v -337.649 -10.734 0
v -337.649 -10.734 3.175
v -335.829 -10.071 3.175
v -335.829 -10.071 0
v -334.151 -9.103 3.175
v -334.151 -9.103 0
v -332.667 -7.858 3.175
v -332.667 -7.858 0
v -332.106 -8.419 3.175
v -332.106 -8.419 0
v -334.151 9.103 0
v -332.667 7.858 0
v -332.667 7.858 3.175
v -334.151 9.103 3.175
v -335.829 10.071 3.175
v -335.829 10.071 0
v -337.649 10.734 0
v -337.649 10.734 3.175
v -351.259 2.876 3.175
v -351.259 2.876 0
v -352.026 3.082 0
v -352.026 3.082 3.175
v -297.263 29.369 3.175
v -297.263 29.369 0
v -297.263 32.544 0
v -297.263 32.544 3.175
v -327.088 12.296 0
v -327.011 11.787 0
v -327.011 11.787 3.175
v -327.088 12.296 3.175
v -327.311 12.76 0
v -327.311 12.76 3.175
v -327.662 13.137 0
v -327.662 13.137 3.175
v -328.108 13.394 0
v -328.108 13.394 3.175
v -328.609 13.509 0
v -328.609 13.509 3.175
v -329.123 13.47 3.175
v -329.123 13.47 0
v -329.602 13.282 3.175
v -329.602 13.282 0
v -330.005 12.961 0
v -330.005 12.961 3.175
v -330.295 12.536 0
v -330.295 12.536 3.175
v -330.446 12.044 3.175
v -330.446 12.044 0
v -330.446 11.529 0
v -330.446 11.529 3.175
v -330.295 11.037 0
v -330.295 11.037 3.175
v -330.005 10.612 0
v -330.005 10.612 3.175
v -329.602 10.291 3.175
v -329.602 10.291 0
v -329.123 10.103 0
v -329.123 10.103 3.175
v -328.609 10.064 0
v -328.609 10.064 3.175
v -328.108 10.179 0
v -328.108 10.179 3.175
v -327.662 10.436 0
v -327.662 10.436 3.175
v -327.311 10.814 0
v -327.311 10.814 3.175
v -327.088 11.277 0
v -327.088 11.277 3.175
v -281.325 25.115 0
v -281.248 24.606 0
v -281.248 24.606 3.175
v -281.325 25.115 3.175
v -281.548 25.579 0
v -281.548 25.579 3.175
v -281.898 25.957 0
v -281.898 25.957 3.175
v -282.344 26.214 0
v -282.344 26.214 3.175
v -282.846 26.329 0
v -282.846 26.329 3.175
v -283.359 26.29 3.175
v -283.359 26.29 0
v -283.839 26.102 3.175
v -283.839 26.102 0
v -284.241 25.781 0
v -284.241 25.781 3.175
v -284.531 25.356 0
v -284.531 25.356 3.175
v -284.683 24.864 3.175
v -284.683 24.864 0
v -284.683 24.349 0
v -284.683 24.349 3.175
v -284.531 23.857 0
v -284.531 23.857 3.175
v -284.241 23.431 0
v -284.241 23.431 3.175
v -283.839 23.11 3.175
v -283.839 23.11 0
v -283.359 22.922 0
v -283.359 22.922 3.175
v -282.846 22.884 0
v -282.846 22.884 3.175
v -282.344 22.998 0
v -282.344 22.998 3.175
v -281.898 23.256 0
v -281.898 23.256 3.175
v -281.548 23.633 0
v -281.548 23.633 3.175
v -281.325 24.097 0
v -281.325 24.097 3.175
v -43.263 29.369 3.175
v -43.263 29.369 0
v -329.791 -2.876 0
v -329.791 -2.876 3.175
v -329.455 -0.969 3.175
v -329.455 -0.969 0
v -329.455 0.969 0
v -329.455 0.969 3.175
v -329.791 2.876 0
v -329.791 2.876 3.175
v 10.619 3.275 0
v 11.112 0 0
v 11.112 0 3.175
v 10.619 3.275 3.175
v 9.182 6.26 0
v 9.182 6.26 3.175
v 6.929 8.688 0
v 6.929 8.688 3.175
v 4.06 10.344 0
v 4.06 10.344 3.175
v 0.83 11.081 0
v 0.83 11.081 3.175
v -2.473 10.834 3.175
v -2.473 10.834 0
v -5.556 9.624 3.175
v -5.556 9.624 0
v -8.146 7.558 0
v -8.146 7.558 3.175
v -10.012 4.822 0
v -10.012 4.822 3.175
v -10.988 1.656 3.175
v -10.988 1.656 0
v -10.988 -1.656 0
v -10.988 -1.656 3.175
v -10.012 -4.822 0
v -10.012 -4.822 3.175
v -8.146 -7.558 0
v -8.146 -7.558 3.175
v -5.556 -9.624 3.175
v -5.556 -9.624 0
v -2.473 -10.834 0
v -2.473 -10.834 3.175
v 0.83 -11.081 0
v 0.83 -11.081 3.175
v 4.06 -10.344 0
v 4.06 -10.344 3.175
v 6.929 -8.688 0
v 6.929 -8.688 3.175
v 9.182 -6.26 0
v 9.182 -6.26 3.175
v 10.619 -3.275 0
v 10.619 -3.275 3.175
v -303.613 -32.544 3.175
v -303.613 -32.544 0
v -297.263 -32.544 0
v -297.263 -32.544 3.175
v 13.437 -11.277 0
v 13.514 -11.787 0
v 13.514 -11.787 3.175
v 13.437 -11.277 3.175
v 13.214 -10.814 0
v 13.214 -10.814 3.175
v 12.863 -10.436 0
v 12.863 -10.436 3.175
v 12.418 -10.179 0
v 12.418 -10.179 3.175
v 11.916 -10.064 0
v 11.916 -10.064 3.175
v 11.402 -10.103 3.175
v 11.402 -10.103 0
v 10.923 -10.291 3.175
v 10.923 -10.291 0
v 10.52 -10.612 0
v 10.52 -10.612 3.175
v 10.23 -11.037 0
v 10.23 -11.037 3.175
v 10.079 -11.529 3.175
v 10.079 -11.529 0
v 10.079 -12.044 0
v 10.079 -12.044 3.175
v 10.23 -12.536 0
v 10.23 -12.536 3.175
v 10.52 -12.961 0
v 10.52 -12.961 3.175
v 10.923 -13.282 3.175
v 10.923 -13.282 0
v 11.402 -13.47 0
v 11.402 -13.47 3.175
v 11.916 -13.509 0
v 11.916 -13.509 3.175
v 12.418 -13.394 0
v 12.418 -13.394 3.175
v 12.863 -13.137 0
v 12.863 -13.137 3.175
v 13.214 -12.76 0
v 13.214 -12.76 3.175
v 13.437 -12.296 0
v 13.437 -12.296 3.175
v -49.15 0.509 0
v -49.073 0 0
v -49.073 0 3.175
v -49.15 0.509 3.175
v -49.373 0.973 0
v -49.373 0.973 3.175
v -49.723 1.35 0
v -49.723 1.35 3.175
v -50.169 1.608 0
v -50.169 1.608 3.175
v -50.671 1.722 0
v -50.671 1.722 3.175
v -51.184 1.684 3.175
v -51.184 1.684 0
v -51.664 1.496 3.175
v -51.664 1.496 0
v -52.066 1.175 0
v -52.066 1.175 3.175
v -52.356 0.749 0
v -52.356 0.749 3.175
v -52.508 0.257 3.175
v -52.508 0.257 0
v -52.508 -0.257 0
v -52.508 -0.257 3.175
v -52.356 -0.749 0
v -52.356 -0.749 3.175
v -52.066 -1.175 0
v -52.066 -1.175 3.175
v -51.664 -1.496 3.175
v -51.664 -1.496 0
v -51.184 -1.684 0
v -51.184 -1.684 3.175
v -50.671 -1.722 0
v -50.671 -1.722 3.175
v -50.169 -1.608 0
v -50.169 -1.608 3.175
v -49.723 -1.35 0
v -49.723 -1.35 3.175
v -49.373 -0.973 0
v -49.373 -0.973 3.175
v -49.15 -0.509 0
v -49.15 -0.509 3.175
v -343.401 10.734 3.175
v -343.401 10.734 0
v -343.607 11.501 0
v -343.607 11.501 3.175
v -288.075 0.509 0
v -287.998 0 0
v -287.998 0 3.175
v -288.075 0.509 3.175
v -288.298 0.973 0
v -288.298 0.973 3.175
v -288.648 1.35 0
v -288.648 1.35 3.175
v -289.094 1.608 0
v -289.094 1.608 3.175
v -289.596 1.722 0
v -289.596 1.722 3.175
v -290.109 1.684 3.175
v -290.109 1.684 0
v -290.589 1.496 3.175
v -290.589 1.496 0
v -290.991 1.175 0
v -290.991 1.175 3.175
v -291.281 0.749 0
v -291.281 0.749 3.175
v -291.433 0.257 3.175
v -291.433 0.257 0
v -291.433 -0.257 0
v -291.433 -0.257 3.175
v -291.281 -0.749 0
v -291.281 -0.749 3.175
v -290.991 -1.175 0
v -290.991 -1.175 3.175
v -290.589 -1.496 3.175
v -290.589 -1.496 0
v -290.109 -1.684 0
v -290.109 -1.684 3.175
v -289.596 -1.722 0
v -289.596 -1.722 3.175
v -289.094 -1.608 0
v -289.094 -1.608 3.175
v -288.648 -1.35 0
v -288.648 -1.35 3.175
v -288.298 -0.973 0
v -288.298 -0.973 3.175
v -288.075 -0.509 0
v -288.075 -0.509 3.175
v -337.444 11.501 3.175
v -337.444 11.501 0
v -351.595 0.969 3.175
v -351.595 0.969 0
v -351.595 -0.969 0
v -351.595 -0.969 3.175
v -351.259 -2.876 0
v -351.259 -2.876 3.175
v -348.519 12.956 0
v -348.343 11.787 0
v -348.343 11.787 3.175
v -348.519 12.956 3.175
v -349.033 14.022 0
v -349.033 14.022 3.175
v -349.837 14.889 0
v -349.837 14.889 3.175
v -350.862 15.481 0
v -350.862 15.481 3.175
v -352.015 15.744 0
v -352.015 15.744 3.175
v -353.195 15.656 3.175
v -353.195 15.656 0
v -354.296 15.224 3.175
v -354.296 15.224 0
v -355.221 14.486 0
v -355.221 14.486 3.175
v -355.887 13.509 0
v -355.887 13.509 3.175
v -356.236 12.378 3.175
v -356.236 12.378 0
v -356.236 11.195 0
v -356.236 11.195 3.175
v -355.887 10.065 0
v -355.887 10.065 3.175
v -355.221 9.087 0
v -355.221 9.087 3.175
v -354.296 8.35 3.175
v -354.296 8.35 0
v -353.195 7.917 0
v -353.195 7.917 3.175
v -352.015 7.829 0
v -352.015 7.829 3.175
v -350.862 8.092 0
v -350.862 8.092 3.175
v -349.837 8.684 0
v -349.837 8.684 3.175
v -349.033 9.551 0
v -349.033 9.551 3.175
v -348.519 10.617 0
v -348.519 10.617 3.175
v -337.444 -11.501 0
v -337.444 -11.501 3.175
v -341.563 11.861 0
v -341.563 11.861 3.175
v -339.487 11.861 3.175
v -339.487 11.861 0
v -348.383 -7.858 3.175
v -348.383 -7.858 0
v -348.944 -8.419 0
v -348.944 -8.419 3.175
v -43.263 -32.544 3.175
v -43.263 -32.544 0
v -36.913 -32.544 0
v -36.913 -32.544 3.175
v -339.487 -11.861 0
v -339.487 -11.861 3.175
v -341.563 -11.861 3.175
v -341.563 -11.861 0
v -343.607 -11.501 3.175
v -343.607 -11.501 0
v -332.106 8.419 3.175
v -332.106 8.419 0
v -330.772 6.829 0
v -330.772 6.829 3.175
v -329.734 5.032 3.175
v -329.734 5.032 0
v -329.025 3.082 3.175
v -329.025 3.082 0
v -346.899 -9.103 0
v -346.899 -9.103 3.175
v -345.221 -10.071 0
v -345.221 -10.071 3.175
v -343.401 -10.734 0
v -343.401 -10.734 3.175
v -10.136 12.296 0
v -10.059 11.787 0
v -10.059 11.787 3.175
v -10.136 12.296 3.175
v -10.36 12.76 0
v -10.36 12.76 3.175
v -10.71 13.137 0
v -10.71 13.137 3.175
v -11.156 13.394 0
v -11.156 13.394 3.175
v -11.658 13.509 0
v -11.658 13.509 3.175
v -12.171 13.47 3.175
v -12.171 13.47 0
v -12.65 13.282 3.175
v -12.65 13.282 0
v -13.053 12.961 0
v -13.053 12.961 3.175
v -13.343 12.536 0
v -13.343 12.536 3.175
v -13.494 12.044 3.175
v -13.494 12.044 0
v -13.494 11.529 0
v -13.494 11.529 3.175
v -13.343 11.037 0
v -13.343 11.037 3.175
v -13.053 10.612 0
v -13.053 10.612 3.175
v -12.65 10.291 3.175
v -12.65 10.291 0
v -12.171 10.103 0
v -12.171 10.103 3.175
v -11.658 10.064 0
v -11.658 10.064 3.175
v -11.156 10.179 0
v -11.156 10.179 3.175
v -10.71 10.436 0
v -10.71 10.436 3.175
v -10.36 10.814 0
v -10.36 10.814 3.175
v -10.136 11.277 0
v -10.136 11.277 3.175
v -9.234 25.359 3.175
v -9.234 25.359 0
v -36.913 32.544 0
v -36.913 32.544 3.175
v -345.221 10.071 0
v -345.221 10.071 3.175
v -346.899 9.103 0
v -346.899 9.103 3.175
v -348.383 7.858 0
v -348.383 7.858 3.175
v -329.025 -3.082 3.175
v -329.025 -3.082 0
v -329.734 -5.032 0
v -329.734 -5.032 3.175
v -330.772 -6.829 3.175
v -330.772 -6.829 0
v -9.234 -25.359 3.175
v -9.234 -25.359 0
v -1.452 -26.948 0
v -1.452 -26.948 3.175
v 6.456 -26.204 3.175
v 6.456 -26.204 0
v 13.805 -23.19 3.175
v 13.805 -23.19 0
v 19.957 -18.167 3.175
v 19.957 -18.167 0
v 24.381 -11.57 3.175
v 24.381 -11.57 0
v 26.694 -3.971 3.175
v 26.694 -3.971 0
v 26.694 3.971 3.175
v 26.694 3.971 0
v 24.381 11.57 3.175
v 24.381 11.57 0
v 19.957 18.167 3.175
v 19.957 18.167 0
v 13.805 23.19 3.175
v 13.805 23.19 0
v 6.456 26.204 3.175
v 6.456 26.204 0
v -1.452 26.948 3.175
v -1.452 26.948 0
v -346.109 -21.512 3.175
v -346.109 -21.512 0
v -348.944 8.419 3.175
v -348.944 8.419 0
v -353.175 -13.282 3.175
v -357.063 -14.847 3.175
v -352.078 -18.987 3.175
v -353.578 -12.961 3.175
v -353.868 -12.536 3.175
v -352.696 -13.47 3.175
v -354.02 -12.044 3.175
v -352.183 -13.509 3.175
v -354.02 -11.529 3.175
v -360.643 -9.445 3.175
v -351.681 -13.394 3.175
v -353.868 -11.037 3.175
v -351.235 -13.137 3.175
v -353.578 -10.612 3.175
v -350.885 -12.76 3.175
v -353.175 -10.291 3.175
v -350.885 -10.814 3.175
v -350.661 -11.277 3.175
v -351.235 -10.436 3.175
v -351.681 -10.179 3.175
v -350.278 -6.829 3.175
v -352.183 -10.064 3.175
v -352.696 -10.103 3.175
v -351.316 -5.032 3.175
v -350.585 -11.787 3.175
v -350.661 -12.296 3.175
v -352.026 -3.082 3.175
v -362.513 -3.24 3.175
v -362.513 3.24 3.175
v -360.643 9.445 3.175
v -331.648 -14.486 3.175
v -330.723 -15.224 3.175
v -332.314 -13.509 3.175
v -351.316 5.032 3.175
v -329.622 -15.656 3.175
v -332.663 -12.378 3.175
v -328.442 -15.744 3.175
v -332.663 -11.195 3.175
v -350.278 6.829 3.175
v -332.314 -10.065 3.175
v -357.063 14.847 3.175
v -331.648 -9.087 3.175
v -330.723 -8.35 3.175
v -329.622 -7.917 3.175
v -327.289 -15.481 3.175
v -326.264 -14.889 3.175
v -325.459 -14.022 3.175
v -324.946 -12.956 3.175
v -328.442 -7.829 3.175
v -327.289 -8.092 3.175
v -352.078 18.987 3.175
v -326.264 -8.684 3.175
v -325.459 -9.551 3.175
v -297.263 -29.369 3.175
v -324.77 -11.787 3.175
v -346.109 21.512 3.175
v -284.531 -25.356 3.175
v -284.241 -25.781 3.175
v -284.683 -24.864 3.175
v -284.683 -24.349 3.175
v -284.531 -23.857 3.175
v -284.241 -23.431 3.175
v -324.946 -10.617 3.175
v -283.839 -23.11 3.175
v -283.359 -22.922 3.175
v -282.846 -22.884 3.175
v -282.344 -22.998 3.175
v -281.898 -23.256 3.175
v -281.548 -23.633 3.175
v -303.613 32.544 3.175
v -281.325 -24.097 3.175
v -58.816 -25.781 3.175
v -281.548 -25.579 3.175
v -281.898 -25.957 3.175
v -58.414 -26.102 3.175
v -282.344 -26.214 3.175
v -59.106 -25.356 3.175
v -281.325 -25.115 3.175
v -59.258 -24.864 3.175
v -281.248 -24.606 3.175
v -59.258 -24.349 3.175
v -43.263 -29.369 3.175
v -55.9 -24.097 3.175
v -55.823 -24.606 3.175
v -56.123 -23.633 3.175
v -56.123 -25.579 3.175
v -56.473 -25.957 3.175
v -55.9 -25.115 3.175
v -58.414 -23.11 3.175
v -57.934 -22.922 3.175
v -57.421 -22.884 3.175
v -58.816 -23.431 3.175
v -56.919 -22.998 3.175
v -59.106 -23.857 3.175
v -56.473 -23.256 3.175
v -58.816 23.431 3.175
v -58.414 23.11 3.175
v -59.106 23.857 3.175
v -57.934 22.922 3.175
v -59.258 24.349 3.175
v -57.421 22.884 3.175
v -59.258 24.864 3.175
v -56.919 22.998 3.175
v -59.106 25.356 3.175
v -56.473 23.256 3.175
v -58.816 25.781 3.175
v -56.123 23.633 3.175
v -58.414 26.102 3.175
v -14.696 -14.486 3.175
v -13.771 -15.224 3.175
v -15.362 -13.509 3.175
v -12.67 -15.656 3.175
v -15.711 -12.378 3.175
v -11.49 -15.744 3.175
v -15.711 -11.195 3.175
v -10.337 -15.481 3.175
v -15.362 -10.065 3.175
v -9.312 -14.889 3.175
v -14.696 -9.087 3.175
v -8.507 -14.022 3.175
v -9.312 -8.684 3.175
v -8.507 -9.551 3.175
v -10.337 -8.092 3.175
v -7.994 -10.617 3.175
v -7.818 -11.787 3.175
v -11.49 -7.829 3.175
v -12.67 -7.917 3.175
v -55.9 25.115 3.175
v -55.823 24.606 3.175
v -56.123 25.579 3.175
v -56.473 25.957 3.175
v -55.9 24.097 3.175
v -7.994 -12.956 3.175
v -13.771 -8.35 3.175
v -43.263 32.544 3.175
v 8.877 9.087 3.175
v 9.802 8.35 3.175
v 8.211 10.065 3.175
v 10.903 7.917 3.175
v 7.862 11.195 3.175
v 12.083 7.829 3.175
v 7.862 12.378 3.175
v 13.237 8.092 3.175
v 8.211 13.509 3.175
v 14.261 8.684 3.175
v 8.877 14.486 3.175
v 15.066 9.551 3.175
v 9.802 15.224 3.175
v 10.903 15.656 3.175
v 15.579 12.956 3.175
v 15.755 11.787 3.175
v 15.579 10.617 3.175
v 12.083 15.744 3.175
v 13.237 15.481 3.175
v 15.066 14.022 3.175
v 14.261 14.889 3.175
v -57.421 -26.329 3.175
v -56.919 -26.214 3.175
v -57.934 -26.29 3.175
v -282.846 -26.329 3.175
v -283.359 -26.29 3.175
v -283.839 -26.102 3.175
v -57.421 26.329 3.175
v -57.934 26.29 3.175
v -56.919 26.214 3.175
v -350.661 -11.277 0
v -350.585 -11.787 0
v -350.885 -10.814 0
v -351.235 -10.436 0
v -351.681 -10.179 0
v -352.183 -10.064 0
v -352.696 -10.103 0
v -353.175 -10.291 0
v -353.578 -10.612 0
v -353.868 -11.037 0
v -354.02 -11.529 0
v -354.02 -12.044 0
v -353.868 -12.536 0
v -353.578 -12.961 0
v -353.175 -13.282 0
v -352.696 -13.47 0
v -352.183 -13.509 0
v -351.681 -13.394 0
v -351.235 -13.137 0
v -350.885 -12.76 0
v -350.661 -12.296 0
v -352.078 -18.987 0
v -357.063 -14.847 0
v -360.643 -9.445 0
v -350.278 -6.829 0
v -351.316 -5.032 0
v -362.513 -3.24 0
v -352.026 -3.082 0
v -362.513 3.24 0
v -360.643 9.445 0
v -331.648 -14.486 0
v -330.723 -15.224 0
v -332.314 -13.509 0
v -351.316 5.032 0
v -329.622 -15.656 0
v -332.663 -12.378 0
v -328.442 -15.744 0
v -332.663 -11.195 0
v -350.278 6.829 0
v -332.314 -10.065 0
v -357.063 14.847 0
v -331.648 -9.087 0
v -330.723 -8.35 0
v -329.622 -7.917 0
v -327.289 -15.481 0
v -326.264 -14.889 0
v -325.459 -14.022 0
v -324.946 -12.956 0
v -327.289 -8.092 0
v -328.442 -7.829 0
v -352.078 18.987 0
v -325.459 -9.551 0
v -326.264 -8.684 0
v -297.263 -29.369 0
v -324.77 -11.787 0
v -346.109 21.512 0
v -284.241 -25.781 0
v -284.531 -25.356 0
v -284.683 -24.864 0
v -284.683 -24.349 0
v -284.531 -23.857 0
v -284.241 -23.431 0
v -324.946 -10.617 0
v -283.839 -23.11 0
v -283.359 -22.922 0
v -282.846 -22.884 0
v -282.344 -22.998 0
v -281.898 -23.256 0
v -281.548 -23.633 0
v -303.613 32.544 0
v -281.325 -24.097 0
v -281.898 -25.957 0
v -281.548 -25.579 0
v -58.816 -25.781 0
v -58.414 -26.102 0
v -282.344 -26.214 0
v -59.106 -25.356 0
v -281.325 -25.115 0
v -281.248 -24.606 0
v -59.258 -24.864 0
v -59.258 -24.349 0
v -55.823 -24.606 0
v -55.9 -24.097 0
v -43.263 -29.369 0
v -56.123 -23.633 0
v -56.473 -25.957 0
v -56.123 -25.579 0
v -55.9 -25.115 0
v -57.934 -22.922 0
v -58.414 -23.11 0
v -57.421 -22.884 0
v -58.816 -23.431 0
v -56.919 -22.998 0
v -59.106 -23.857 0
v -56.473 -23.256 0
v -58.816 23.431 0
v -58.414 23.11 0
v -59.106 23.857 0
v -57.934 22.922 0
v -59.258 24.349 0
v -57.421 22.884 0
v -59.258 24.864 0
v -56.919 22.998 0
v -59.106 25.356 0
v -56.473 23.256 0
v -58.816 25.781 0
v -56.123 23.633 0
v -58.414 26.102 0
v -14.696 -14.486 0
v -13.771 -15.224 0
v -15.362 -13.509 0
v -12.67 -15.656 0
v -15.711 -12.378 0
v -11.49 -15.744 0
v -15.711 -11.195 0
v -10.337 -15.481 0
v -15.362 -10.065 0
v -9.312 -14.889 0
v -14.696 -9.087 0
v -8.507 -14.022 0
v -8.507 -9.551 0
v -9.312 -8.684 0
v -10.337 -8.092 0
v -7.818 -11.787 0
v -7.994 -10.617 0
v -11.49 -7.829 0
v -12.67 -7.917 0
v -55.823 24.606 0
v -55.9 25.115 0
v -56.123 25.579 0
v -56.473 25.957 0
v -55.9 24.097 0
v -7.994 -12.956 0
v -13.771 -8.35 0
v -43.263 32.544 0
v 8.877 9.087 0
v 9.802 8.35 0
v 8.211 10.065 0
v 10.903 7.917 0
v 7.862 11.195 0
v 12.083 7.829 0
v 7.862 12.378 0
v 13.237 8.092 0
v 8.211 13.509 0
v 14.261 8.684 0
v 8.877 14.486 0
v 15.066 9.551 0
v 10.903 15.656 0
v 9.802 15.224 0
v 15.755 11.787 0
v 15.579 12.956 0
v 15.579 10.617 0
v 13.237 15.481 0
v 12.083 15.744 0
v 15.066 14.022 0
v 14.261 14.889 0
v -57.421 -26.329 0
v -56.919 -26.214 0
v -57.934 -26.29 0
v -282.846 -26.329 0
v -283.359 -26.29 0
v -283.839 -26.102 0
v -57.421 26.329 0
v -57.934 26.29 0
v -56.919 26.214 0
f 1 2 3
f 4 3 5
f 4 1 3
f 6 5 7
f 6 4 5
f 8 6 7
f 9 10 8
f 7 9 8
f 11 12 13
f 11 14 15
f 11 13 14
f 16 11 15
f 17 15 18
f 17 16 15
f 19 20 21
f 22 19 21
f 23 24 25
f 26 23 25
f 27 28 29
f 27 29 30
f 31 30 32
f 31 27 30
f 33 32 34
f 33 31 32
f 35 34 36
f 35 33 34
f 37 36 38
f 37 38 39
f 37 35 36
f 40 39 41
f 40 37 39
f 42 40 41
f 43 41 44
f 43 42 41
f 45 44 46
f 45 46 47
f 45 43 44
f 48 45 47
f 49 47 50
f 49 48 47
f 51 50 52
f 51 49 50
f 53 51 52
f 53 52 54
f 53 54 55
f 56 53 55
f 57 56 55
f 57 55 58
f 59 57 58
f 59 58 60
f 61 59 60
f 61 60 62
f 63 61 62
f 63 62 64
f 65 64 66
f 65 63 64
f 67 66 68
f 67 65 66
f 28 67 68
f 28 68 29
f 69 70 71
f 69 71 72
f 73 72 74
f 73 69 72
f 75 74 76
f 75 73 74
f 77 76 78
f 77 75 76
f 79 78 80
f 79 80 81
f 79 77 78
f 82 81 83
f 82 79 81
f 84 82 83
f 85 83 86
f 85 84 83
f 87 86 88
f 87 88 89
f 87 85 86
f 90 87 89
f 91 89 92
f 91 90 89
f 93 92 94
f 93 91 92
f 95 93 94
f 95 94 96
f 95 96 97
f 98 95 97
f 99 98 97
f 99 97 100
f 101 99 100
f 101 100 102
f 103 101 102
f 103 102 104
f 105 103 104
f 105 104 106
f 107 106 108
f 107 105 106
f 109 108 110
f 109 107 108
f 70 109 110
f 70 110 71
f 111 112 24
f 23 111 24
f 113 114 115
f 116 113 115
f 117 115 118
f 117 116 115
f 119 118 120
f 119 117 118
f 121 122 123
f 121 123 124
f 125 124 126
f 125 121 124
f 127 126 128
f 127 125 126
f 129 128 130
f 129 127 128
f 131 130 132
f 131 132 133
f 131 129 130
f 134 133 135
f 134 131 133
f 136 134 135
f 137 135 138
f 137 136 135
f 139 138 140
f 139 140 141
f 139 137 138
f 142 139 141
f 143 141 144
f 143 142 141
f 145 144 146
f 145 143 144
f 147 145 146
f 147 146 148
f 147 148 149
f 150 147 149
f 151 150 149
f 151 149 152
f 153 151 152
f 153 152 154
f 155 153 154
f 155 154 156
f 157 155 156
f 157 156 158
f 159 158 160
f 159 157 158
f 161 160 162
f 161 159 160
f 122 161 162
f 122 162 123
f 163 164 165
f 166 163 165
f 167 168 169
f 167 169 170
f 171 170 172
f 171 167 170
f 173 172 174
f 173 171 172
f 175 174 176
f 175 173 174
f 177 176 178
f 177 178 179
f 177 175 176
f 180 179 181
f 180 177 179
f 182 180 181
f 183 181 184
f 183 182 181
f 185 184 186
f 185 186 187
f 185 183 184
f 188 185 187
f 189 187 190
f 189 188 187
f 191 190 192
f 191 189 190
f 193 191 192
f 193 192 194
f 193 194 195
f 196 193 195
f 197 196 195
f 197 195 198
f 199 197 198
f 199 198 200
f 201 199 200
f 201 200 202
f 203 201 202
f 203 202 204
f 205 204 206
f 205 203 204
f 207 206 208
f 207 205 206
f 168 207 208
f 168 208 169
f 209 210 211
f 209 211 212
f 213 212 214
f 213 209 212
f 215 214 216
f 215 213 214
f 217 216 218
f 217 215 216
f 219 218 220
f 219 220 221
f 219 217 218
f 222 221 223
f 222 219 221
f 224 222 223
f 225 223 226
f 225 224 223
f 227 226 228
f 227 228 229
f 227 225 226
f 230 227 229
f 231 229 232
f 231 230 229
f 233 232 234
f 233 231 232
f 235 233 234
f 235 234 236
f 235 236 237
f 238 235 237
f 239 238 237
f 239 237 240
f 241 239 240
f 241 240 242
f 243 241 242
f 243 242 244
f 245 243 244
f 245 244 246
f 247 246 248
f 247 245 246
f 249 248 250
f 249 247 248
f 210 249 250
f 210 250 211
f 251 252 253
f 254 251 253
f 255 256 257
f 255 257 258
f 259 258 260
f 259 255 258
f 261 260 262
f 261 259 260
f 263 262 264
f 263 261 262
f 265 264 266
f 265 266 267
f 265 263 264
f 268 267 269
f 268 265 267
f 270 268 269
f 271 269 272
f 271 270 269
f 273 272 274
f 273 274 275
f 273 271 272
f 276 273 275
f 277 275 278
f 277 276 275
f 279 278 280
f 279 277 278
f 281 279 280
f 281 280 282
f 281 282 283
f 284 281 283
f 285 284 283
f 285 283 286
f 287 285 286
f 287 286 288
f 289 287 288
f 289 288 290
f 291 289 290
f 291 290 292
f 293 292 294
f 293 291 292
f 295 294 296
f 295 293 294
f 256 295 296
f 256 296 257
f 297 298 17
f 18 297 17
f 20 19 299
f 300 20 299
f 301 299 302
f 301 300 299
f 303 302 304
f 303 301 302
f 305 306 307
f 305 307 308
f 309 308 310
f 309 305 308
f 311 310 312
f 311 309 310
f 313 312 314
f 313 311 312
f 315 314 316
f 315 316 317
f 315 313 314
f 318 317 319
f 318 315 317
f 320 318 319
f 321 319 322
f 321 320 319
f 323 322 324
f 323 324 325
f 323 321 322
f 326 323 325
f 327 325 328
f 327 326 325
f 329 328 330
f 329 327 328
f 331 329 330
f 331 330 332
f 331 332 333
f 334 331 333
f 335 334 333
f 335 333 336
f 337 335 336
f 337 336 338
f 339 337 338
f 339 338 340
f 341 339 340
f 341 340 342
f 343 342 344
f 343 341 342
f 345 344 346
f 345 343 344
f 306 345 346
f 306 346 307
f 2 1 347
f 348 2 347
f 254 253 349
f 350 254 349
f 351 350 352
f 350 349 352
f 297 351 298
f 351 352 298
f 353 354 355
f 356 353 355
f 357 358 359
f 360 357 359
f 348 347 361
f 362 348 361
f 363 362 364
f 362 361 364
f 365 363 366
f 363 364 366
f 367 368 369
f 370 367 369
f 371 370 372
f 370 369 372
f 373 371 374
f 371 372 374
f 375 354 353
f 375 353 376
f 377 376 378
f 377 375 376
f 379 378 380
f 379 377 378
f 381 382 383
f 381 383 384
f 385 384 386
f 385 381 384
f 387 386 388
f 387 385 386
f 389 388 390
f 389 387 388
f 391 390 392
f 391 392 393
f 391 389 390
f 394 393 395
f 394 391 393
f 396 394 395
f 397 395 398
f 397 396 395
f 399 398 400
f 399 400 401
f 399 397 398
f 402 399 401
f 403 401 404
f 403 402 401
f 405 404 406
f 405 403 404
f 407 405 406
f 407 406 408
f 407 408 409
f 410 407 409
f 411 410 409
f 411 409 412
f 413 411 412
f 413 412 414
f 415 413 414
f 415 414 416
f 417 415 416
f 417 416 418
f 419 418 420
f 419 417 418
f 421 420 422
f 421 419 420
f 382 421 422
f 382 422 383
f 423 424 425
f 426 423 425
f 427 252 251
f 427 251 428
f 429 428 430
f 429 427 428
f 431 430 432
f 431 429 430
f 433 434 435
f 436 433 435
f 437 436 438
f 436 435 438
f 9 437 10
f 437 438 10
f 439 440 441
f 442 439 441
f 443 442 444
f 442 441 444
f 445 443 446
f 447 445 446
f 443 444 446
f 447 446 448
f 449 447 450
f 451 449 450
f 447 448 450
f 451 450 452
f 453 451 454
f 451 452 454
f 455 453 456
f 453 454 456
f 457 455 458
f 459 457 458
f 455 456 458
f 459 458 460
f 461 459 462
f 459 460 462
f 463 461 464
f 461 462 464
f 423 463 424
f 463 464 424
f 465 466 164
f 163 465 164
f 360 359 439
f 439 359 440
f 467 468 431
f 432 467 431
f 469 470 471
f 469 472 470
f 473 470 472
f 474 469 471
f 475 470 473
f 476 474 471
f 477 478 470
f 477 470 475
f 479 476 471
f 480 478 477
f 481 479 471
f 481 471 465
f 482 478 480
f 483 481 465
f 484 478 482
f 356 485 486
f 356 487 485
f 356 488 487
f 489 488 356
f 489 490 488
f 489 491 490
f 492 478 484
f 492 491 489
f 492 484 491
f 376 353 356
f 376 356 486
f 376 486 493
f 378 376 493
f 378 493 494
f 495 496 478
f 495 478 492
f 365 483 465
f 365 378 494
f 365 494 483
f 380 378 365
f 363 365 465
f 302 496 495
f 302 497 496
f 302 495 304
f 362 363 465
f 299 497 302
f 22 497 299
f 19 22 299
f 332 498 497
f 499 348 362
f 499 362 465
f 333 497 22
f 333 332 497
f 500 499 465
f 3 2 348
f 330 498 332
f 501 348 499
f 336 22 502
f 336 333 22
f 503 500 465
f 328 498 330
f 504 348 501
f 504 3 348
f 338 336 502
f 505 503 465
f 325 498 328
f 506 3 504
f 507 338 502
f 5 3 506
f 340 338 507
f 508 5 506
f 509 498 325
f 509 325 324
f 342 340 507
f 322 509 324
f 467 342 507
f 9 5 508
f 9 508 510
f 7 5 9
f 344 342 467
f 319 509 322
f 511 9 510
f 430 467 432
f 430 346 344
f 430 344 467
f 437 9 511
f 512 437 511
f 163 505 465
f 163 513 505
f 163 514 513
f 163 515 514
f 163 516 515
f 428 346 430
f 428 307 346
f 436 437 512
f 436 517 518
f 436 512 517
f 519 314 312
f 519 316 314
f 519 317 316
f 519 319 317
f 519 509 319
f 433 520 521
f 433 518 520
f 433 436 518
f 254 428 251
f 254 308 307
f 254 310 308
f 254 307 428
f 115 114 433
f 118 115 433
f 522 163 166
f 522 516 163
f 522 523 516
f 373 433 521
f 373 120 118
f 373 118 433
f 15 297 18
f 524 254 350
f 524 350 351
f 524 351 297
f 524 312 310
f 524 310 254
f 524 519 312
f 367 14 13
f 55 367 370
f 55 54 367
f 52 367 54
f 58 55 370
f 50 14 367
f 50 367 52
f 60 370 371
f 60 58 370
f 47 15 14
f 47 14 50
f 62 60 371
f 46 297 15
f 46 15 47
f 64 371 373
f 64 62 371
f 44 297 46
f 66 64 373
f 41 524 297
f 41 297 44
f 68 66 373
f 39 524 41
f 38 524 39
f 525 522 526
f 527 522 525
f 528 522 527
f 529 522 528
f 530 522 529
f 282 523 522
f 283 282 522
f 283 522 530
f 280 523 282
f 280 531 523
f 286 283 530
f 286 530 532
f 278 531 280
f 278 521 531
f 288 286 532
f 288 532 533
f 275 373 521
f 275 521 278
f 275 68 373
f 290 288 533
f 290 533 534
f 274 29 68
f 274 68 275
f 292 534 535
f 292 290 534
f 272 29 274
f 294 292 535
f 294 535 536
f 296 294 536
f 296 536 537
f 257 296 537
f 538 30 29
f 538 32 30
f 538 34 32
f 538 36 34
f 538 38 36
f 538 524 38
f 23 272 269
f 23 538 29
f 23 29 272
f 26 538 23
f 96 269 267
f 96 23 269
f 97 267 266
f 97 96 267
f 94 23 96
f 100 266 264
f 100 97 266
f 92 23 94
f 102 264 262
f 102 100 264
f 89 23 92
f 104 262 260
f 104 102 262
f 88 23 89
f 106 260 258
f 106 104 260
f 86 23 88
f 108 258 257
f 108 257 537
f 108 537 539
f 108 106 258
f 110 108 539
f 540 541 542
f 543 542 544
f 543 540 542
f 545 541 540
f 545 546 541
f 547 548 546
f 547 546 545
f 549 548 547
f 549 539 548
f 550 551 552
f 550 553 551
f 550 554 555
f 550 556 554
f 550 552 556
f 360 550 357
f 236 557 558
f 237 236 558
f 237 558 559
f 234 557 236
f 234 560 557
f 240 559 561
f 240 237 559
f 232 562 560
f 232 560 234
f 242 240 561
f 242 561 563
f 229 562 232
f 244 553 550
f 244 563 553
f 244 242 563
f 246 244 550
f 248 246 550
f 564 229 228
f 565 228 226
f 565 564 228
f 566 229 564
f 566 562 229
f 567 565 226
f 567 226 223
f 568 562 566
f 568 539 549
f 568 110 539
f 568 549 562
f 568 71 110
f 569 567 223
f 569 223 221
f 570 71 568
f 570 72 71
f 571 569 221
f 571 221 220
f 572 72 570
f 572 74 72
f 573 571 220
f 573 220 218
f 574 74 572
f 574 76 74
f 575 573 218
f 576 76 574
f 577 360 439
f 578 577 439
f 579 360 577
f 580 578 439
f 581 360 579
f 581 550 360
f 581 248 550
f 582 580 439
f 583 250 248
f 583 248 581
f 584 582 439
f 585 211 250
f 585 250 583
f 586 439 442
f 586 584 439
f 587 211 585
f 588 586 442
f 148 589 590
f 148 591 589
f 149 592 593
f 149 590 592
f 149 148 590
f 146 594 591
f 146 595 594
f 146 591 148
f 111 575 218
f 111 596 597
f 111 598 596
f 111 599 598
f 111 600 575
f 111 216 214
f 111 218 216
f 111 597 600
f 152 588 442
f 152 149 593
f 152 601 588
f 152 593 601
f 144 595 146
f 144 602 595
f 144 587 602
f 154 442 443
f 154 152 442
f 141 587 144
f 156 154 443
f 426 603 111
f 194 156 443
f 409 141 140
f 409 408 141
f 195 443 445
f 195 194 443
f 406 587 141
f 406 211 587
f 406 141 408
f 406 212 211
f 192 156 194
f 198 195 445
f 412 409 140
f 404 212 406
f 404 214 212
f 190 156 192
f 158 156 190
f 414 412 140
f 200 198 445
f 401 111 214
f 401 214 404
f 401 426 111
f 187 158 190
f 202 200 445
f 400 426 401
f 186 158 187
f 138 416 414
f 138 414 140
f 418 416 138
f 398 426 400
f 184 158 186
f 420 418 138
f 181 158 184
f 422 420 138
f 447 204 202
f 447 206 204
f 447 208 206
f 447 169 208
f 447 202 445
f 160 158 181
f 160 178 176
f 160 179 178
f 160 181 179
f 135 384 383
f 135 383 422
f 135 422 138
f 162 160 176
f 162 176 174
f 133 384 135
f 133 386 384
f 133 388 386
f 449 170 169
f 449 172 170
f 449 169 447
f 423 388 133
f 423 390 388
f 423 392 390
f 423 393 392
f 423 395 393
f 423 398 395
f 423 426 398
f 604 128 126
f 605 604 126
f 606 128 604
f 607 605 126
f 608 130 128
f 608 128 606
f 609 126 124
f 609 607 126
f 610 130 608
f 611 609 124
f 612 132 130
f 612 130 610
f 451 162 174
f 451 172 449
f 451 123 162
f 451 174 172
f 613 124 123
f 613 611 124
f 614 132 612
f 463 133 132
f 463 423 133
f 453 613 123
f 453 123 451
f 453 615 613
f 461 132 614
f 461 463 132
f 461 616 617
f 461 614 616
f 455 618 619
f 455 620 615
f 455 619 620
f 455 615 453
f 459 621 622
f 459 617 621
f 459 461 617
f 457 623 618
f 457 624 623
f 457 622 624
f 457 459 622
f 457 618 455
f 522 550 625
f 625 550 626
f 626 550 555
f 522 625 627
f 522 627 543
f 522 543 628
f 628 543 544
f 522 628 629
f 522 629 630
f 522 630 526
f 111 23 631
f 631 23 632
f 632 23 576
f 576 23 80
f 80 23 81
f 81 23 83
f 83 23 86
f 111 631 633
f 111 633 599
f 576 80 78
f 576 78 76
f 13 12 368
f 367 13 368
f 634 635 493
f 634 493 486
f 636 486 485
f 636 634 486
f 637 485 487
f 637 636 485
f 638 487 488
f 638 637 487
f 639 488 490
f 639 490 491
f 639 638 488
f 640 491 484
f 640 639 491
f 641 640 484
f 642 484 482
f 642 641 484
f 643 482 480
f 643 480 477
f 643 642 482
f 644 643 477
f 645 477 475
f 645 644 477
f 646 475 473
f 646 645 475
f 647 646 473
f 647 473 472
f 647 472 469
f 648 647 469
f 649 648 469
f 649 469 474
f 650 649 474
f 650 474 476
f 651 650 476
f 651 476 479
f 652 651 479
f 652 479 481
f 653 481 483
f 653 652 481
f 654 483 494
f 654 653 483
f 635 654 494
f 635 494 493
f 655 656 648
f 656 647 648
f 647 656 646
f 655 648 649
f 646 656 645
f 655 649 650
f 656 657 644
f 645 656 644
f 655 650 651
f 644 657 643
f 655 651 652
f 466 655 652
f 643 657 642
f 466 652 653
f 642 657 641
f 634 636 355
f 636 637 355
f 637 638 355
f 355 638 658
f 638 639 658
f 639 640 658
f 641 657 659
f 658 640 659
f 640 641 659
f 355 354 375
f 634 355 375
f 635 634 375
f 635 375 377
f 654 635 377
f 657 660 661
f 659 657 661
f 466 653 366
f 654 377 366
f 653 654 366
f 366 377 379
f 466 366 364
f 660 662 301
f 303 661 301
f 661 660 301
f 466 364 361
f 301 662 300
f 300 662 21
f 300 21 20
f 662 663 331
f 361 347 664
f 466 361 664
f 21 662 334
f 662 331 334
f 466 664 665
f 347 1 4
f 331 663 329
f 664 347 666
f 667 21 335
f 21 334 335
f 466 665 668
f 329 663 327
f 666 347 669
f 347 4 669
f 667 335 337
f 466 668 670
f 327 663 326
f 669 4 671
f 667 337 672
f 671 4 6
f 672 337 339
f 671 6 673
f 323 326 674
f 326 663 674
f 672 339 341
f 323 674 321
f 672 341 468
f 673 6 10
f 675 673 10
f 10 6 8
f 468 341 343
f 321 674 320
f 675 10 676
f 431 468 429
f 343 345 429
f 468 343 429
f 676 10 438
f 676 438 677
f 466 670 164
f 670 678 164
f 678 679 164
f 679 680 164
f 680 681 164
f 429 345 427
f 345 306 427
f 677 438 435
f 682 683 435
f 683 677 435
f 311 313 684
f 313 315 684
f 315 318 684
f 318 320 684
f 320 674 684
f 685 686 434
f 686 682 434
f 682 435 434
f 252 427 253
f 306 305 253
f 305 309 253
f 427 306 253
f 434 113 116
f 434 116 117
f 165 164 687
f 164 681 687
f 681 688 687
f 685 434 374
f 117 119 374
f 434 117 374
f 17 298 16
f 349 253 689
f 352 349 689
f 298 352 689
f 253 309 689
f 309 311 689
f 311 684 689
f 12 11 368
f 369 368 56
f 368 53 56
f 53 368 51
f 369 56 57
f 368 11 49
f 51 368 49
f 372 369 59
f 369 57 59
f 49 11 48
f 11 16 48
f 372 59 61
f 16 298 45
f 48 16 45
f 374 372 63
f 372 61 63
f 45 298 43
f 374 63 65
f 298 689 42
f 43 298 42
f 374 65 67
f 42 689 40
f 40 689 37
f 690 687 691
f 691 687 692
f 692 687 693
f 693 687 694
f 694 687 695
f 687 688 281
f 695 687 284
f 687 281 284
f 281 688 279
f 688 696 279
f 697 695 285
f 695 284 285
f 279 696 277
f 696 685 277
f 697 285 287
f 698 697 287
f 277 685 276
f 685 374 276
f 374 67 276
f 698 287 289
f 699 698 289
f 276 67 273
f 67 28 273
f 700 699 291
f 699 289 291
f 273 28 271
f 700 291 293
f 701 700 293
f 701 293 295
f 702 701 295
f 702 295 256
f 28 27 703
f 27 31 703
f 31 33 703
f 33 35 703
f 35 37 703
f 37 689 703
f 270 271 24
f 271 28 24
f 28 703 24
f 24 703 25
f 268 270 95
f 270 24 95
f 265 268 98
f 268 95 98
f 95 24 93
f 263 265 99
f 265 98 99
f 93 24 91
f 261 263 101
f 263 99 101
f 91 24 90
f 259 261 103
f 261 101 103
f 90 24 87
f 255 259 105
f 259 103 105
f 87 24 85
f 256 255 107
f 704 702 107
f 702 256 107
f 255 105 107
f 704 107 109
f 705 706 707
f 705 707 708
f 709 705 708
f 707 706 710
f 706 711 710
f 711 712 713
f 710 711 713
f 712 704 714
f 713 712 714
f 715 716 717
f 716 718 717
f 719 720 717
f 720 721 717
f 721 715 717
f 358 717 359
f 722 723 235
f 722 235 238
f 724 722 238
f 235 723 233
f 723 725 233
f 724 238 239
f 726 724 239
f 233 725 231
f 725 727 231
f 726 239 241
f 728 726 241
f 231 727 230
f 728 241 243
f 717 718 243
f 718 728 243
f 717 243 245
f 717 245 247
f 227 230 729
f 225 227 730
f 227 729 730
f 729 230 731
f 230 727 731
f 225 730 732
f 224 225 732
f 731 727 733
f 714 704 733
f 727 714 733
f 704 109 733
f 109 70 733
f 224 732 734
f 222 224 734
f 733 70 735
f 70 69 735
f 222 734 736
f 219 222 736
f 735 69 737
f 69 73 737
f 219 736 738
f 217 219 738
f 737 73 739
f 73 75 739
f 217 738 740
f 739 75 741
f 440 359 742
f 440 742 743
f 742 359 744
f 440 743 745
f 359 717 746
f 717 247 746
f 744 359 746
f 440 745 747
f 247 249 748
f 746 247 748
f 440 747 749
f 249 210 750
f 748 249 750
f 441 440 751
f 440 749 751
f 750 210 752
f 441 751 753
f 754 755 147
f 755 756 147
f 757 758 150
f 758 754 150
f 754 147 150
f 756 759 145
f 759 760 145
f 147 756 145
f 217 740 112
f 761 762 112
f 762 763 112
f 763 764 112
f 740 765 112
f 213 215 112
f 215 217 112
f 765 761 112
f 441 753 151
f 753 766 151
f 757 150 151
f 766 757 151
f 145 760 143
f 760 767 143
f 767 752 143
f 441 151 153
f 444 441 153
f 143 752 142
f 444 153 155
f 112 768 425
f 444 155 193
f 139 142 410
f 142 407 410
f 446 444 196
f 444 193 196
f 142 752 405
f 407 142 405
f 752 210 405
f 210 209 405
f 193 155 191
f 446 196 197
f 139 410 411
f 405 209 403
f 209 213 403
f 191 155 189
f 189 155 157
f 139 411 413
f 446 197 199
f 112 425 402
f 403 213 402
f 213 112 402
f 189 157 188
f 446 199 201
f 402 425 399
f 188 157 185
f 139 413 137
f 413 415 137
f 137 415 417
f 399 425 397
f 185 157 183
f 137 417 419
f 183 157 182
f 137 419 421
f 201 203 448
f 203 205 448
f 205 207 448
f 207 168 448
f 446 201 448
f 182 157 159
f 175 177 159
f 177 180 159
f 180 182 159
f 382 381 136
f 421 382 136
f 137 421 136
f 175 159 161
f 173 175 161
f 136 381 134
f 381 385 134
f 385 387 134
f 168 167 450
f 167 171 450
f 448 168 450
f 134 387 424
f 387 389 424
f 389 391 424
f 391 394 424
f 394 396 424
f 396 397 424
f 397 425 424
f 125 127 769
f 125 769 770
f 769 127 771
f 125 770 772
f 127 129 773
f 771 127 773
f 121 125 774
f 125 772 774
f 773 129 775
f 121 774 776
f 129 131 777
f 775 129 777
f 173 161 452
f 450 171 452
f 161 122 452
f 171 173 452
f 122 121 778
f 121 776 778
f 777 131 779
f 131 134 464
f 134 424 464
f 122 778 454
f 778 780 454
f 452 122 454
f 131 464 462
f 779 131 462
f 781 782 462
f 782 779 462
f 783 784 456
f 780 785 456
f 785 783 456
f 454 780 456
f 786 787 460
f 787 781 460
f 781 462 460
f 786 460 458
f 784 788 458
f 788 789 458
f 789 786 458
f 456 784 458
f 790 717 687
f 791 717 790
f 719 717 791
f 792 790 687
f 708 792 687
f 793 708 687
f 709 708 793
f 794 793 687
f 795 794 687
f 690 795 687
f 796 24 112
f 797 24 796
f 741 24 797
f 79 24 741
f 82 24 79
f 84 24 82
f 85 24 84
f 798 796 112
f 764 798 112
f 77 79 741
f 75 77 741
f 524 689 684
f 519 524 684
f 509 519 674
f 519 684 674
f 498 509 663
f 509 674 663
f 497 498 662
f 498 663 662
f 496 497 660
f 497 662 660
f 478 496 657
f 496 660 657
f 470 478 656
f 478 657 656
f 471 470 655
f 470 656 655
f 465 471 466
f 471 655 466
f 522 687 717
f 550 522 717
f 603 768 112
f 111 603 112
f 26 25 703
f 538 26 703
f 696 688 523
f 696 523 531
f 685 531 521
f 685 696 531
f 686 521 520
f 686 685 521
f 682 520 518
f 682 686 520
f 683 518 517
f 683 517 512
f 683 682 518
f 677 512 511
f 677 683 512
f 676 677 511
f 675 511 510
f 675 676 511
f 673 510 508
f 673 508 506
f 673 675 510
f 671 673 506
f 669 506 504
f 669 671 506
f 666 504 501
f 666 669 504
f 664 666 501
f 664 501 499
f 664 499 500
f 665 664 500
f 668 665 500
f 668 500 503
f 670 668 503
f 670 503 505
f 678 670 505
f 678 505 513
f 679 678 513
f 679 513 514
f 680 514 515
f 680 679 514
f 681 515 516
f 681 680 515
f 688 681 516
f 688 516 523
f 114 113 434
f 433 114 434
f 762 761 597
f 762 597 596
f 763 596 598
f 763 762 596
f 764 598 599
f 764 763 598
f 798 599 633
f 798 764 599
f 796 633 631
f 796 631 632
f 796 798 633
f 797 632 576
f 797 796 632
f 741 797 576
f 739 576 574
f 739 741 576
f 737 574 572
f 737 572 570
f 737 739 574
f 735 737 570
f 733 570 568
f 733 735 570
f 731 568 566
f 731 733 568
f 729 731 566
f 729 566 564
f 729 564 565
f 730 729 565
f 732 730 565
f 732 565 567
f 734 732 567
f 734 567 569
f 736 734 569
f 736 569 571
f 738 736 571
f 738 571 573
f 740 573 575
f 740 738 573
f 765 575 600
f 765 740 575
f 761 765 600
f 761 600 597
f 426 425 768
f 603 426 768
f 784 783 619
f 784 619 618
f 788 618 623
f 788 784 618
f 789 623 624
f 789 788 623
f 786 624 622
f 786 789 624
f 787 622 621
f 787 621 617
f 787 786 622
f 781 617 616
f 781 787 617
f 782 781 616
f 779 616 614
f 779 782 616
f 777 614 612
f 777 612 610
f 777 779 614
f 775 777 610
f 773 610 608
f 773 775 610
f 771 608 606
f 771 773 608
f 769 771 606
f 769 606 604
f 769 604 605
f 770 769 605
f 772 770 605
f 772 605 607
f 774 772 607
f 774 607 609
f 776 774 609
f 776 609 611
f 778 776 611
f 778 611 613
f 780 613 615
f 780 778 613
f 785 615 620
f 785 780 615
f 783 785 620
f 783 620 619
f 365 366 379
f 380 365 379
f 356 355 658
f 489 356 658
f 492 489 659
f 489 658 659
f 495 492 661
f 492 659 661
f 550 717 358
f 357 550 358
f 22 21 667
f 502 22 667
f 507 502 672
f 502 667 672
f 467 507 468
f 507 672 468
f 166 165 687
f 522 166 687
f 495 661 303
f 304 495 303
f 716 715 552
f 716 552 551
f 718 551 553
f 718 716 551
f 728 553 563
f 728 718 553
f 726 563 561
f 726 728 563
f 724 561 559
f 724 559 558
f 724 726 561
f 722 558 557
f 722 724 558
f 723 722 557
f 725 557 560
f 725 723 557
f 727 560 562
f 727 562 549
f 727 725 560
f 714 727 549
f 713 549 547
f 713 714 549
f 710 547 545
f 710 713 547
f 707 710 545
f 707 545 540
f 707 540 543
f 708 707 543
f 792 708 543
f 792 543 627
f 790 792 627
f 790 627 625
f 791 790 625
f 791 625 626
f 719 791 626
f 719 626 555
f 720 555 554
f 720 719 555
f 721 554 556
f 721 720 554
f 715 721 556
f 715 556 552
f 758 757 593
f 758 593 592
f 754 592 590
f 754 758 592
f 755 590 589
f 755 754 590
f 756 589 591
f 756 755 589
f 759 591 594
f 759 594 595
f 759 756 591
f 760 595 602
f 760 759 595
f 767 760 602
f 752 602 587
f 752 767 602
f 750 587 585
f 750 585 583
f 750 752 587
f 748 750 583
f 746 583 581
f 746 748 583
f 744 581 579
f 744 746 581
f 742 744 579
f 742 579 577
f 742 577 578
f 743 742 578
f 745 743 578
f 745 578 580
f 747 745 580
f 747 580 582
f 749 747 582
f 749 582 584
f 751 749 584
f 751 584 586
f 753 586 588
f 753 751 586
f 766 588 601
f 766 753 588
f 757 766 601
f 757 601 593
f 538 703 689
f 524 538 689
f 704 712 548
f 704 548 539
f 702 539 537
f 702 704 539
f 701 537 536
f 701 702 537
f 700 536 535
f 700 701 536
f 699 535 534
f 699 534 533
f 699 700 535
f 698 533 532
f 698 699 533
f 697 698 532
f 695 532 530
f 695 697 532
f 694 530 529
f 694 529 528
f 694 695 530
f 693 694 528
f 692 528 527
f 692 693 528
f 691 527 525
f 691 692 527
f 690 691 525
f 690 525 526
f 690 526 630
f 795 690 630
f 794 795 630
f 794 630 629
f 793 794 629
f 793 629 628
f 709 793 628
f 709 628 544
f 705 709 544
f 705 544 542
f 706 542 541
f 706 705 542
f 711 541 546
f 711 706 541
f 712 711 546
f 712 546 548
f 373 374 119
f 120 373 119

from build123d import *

# Parameters (mm, degrees)
F0_R     = 1.7272
F0_R_2   = 3.96875
F0_R_3   = 11.1125
F1_DEPTH = 3.175
F3_DEPTH = 3.175
F4_COUNT = 6
F4_ANGLE = 300


with BuildPart() as f1:
    # F0 (on Top) → F1 (new body)
    with BuildSketch(Plane.XY):
        with BuildLine():
            Line((-303.6125627, 32.54375), (-346.1094200534, 21.5120031198))
            ThreePointArc((-346.1094200534, 21.5120031198), (-362.7501254, 0), (-346.1094200534, -21.5120031198))
            Line((-346.1094200534, -21.5120031198), (-303.6125627, -32.54375))
            Line((-303.6125627, -32.54375), (-297.2625627, -32.54375))
            Line((-297.2625627, -32.54375), (-297.2625627, -29.36875))
            Line((-297.2625627, -29.36875), (-43.2625627, -29.36875))
            Line((-43.2625627, -29.36875), (-43.2625627, -32.54375))
            Line((-43.2625627, -32.54375), (-36.9125627, -32.54375))
            Line((-36.9125627, -32.54375), (-9.2338657221, -25.3586450757))
            ThreePointArc((-9.2338657221, -25.3586450757), (26.9875, 0), (-9.2338657221, 25.3586450757))
            Line((-9.2338657221, 25.3586450757), (-36.9125627, 32.54375))
            Line((-36.9125627, 32.54375), (-43.2625627, 32.54375))
            Line((-43.2625627, 32.54375), (-43.2625627, 29.36875))
            Line((-43.2625627, 29.36875), (-297.2625627, 29.36875))
            Line((-297.2625627, 29.36875), (-297.2625627, 32.54375))
            Line((-297.2625627, 32.54375), (-303.6125627, 32.54375))
        make_face()
        with Locations((-282.9750627, -24.60625)):
            Circle(F0_R, mode=Mode.SUBTRACT)
        with Locations((-352.3117115589, -11.7865861589)):
            Circle(F0_R, mode=Mode.SUBTRACT)
        with Locations((-328.7385392411, -11.7865861589)):
            Circle(F0_R_2, mode=Mode.SUBTRACT)
        with Locations((-57.5500627, -24.60625)):
            Circle(F0_R, mode=Mode.SUBTRACT)
        with Locations((-11.7865861589, -11.7865861589)):
            Circle(F0_R_2, mode=Mode.SUBTRACT)
        with Locations((11.7865861589, -11.7865861589)):
            Circle(F0_R, mode=Mode.SUBTRACT)
        with Locations((-340.5251254, 0)):
            Circle(F0_R_3, mode=Mode.SUBTRACT)
        with Locations((-289.7251254, 0)):
            Circle(F0_R, mode=Mode.SUBTRACT)
        with Locations((-352.3117115589, 11.7865861589)):
            Circle(F0_R_2, mode=Mode.SUBTRACT)
        with Locations((-328.7385392411, 11.7865861589)):
            Circle(F0_R, mode=Mode.SUBTRACT)
        with Locations((-282.9750627, 24.60625)):
            Circle(F0_R, mode=Mode.SUBTRACT)
        with Locations((-50.8, 0)):
            Circle(F0_R, mode=Mode.SUBTRACT)
        Circle(F0_R_3, mode=Mode.SUBTRACT)
        with Locations((-11.7865861589, 11.7865861589)):
            Circle(F0_R, mode=Mode.SUBTRACT)
        with Locations((11.7865861589, 11.7865861589)):
            Circle(F0_R_2, mode=Mode.SUBTRACT)
        with Locations((-57.5500627, 24.60625)):
            Circle(F0_R, mode=Mode.SUBTRACT)
    extrude(amount=F1_DEPTH)

    # F2 (on face) → F3 (cut, through all)
    with BuildSketch(Plane(origin=(0, 0, 0), x_dir=(1, 0, 0), z_dir=(0, 0, -1))):
        with BuildLine():
            ThreePointArc((-348.3828495059, -7.8577241059), (-350.1488326996, -5.55625), (-351.2589761446, -2.8761266387))
            Line((-351.2589761446, -2.8761266387), (-352.0256797693, -3.0815642558))
            ThreePointArc((-352.0256797693, -3.0815642558), (-350.8362403638, -5.953125), (-348.9441155135, -8.4189901135))
            Line((-348.9441155135, -8.4189901135), (-348.3828495059, -7.8577241059))
        make_face()
    f3 = extrude(amount=-F3_DEPTH, mode=Mode.SUBTRACT)

    # F4: F3 ×6 about axis
    f4_axis = Axis((-340.5251254, 0, 0), (0, 0, -1))
    for i in range(1, F4_COUNT):
        add(f3.rotate(f4_axis, i * F4_ANGLE / (F4_COUNT - 1)), mode=Mode.SUBTRACT)


solid = f1.part
